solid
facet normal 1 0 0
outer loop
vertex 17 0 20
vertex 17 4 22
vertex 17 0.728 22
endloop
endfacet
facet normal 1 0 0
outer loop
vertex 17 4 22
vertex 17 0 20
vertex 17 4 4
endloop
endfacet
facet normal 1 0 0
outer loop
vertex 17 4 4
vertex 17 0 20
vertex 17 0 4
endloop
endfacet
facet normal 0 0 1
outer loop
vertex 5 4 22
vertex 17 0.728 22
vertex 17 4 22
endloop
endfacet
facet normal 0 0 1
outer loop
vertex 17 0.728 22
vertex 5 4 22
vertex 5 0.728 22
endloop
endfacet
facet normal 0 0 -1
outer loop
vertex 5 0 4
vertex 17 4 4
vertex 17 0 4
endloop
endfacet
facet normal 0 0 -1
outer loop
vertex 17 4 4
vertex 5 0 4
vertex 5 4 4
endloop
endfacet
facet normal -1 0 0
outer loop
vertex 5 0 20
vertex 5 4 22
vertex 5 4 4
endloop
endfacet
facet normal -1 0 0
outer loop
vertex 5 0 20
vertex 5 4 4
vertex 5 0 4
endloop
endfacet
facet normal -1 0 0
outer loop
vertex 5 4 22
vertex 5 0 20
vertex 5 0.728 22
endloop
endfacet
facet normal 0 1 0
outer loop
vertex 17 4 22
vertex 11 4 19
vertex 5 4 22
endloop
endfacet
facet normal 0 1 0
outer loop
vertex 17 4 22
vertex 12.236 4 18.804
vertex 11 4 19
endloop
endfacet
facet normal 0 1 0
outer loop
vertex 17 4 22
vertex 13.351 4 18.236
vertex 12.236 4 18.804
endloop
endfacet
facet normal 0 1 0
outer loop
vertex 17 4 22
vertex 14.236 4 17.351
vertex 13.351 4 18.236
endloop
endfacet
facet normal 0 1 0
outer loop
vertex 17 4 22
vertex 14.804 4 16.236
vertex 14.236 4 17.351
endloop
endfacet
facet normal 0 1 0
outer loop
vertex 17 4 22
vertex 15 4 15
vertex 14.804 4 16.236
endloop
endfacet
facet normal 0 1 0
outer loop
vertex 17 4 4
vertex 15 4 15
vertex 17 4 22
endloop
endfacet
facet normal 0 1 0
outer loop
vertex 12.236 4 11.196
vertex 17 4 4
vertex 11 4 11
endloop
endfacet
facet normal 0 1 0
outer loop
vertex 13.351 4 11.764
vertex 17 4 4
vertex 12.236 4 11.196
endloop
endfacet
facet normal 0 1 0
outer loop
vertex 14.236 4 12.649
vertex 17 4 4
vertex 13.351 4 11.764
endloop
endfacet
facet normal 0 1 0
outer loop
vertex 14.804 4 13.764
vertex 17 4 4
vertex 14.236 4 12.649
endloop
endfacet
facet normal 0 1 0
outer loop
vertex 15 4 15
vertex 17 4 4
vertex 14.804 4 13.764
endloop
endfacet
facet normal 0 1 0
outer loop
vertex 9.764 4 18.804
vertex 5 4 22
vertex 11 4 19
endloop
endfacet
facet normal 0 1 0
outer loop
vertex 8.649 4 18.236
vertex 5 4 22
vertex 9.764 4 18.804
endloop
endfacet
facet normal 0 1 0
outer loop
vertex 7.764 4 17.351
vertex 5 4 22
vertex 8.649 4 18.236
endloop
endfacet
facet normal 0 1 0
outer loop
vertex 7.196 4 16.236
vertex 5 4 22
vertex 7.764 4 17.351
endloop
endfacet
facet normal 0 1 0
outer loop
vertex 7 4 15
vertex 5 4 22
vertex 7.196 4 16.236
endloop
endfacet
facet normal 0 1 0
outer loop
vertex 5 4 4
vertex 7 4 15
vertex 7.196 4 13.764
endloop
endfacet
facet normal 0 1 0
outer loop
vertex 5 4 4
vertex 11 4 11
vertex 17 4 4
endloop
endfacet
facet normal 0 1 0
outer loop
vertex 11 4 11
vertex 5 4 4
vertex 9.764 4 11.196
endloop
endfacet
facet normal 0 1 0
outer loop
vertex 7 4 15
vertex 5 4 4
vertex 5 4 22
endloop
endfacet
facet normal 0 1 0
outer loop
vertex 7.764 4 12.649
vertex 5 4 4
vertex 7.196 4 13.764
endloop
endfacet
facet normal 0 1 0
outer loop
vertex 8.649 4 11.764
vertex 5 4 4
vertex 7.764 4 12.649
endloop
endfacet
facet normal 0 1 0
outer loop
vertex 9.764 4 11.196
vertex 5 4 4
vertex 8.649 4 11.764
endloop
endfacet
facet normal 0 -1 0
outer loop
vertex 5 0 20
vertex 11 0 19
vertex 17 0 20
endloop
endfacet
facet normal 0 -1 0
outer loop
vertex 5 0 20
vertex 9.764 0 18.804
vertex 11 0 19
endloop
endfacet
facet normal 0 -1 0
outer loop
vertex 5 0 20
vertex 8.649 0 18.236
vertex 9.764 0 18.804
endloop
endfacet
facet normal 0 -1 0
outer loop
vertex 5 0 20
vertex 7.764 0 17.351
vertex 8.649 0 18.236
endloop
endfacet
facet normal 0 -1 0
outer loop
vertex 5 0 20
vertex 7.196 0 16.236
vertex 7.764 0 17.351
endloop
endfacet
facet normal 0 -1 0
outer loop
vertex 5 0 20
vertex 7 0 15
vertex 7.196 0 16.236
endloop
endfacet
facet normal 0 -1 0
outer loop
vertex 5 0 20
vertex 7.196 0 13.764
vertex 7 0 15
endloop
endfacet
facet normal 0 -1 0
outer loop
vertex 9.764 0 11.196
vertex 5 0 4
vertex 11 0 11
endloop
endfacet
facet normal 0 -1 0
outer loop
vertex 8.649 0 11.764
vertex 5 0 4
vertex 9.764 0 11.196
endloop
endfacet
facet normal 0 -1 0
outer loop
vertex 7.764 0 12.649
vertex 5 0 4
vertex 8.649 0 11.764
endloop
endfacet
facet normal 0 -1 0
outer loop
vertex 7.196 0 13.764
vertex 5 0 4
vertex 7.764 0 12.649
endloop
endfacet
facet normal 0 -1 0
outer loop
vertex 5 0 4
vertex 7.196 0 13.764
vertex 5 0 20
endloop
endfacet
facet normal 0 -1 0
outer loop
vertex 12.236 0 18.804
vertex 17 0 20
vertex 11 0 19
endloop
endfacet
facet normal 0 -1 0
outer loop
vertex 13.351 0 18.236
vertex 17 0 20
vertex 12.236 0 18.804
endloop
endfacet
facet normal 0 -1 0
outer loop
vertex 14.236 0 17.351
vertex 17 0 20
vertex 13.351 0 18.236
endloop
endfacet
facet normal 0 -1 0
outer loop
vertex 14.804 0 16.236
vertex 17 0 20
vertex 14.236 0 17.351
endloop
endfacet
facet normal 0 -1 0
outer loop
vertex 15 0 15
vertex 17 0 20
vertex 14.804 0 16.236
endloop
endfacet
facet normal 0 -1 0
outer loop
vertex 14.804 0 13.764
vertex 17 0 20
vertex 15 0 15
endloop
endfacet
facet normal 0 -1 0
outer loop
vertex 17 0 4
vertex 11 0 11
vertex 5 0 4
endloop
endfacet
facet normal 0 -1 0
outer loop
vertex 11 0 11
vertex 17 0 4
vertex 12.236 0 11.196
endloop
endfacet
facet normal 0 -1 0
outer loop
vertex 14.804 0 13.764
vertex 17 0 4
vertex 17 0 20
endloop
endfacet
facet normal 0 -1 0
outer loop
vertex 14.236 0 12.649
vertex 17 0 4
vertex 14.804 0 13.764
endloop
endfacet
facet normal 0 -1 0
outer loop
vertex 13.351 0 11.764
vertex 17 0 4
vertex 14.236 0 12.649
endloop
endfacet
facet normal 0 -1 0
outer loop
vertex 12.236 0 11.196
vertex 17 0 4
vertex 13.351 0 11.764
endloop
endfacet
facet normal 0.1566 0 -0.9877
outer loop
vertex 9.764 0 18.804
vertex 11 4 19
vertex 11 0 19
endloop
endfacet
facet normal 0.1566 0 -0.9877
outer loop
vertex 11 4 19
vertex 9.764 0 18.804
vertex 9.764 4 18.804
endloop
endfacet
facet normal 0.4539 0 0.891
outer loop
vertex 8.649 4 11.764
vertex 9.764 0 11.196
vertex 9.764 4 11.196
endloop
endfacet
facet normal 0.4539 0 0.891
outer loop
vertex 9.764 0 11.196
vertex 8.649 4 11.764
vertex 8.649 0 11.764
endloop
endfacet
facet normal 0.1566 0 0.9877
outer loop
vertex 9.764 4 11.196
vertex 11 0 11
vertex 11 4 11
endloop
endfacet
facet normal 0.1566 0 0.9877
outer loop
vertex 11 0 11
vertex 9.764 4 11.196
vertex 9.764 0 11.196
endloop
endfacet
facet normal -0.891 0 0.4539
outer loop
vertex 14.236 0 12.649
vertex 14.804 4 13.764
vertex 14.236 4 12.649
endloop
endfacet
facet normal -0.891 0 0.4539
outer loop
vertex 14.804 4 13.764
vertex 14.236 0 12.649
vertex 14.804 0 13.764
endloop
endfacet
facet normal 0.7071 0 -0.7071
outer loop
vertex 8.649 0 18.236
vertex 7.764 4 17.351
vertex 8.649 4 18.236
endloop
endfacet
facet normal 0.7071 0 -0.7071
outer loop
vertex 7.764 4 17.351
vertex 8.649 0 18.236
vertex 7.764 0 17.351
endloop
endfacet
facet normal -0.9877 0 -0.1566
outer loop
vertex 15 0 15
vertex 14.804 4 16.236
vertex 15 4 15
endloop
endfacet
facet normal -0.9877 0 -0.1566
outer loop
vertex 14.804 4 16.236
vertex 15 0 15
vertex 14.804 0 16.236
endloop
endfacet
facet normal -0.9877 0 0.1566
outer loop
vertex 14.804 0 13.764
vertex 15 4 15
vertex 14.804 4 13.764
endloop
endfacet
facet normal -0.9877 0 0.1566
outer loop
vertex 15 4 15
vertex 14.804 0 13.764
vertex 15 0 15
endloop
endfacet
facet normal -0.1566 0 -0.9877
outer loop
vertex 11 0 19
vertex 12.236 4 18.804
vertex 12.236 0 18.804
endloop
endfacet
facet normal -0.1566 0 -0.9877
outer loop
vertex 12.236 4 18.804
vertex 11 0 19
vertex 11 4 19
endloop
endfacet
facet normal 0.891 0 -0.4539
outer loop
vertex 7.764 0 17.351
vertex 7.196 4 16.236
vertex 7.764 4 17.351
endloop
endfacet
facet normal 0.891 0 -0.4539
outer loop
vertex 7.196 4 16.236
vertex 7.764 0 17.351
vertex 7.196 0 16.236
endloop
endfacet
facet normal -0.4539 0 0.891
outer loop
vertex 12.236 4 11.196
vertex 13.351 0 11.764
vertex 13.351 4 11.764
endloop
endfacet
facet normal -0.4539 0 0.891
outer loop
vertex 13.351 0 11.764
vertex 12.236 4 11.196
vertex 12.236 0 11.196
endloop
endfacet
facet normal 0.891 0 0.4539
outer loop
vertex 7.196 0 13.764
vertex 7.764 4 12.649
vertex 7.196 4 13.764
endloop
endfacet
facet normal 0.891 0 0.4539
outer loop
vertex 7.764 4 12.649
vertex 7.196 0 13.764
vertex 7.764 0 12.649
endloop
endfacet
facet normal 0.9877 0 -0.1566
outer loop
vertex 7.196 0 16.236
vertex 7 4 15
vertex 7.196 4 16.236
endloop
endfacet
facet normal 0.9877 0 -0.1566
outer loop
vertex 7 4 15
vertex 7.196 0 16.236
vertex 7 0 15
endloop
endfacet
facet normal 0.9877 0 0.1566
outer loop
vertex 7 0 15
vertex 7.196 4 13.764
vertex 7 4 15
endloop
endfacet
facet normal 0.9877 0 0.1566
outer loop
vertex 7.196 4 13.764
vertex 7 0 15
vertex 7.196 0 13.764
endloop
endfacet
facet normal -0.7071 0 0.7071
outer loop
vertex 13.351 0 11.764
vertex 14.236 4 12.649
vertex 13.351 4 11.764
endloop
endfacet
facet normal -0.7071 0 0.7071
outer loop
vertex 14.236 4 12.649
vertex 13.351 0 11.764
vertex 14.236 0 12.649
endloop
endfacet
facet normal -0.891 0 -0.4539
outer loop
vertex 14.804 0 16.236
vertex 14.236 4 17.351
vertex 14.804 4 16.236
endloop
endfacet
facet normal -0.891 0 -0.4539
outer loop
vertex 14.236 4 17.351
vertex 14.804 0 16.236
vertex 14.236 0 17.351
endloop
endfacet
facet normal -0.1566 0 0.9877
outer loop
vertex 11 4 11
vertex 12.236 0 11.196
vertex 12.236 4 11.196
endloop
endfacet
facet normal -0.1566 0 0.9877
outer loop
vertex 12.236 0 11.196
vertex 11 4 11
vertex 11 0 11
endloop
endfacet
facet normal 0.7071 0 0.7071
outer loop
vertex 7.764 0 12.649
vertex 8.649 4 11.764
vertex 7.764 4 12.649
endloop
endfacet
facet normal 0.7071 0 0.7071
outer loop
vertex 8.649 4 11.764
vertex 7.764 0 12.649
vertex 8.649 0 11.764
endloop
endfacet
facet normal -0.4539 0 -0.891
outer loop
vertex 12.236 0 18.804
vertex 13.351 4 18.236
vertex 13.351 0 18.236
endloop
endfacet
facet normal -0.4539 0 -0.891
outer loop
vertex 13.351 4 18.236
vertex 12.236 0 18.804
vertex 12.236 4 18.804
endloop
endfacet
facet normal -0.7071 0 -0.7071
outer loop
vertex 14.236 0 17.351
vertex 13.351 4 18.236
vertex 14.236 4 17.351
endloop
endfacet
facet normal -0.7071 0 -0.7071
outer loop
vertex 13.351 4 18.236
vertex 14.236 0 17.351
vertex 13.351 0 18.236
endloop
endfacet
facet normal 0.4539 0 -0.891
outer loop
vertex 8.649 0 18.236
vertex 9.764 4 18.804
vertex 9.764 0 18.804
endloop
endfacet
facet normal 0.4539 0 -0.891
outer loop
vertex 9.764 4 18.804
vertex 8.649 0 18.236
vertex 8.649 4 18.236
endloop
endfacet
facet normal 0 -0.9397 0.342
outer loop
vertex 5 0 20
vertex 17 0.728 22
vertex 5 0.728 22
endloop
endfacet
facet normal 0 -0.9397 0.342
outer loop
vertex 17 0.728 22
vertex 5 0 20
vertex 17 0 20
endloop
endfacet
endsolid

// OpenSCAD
$fn = 20;

height = 120;
thikness = 4;
baseWidth = 60;
edgeWidth = 30;
gripRadius = 6;
gripHoleRadius = gripRadius- thikness;
gripMargin = gripRadius;

// space between edge & paw
pawSpace = 1;
pawWidth = 12;
pawHeight = 18;
holeRadius = 4;
holeLeftSpace = 3;
holeTopSpace = 3;
bevelAngle = 20;
bevelSize = 2;
bevelDepth = 1;

edgeBevelAngle = 30;
edgeBevelWidth = 3;
edgeHoleAngle = 60;
edgeHolePadding = 15;
edgeHoleWidth = 13;
edgeHoleHeight = 18; // from the bottom of the hole


// base
difference() {
    union() {
        cube([baseWidth, height, thikness]);
        translate([baseWidth - gripMargin, height/2, 0]) {
                rotate([90, 0, 0]) {
                    difference() {
                        cylinder(height, r=gripRadius, center=true);    // Grip
                    }
                }
        }
    }
    translate([baseWidth - gripMargin, height/2, 0]) {
            rotate([90, 0, 0]) {
                difference() {
                    cylinder(height, r=gripHoleRadius, center=true);// grip hole
                }
            }
    }
    translate([baseWidth - gripRadius - gripMargin, 0, -gripRadius]) {
        cube([gripRadius*2, height, gripRadius]);       // remove bottom
    }
}

// edge
difference() {
    cube([thikness, height, edgeWidth]);
    translate([0, 0, edgeWidth - edgeBevelWidth])
        rotate([0, -edgeBevelAngle, 0])
            cube([2*thikness, height, 2*thikness]);
    translate([0, 0, edgeWidth-edgeHoleHeight])
        rotate([0, 90-edgeHoleAngle, 0])
            translate([-edgeWidth, 0, 00]) {
                translate([0, edgeHolePadding, 0])
                    cube([edgeWidth, edgeHoleWidth, edgeWidth]);
                translate([0, height - edgeHolePadding - edgeHoleWidth, 0])
                    cube([edgeWidth, edgeHoleWidth, edgeWidth]);
            }
}


// paws
!translate([thikness + pawSpace, 0, thikness]) {
    difference() {
        cube([pawWidth, thikness, pawHeight]);
        // Hole
        translate([pawWidth/2, thikness/2, pawHeight - holeRadius - holeTopSpace]) {
            rotate([0, 90, 90]) {
                cylinder(thikness, r=holeRadius, center=true);
            }
        }
        // Bevel
        translate([0, 0, pawHeight - bevelSize]) 
            rotate([90-bevelAngle, 0, 0]) 
                cube([pawWidth, 2*bevelSize, 2*bevelSize]);
    }
}
translate([2 * thikness + pawSpace + pawWidth, height, 0]) rotate([0, 0, 180]) {
    translate([thikness, 0, thikness]) {
        difference() {
            cube([pawWidth, thikness, pawHeight]);
            // Hole
            translate([pawWidth/2, thikness/2, pawHeight - holeRadius - holeTopSpace]) {
                rotate([0, 90, 90]) {
                    cylinder(thikness, r=holeRadius, center=true);
                }
            }
            // Bevel
            translate([0, 0, pawHeight - bevelSize]) 
                rotate([90-bevelAngle, 0, 0]) 
                    cube([pawWidth, 2*bevelSize, 2*bevelSize]);
        }
    }
}
